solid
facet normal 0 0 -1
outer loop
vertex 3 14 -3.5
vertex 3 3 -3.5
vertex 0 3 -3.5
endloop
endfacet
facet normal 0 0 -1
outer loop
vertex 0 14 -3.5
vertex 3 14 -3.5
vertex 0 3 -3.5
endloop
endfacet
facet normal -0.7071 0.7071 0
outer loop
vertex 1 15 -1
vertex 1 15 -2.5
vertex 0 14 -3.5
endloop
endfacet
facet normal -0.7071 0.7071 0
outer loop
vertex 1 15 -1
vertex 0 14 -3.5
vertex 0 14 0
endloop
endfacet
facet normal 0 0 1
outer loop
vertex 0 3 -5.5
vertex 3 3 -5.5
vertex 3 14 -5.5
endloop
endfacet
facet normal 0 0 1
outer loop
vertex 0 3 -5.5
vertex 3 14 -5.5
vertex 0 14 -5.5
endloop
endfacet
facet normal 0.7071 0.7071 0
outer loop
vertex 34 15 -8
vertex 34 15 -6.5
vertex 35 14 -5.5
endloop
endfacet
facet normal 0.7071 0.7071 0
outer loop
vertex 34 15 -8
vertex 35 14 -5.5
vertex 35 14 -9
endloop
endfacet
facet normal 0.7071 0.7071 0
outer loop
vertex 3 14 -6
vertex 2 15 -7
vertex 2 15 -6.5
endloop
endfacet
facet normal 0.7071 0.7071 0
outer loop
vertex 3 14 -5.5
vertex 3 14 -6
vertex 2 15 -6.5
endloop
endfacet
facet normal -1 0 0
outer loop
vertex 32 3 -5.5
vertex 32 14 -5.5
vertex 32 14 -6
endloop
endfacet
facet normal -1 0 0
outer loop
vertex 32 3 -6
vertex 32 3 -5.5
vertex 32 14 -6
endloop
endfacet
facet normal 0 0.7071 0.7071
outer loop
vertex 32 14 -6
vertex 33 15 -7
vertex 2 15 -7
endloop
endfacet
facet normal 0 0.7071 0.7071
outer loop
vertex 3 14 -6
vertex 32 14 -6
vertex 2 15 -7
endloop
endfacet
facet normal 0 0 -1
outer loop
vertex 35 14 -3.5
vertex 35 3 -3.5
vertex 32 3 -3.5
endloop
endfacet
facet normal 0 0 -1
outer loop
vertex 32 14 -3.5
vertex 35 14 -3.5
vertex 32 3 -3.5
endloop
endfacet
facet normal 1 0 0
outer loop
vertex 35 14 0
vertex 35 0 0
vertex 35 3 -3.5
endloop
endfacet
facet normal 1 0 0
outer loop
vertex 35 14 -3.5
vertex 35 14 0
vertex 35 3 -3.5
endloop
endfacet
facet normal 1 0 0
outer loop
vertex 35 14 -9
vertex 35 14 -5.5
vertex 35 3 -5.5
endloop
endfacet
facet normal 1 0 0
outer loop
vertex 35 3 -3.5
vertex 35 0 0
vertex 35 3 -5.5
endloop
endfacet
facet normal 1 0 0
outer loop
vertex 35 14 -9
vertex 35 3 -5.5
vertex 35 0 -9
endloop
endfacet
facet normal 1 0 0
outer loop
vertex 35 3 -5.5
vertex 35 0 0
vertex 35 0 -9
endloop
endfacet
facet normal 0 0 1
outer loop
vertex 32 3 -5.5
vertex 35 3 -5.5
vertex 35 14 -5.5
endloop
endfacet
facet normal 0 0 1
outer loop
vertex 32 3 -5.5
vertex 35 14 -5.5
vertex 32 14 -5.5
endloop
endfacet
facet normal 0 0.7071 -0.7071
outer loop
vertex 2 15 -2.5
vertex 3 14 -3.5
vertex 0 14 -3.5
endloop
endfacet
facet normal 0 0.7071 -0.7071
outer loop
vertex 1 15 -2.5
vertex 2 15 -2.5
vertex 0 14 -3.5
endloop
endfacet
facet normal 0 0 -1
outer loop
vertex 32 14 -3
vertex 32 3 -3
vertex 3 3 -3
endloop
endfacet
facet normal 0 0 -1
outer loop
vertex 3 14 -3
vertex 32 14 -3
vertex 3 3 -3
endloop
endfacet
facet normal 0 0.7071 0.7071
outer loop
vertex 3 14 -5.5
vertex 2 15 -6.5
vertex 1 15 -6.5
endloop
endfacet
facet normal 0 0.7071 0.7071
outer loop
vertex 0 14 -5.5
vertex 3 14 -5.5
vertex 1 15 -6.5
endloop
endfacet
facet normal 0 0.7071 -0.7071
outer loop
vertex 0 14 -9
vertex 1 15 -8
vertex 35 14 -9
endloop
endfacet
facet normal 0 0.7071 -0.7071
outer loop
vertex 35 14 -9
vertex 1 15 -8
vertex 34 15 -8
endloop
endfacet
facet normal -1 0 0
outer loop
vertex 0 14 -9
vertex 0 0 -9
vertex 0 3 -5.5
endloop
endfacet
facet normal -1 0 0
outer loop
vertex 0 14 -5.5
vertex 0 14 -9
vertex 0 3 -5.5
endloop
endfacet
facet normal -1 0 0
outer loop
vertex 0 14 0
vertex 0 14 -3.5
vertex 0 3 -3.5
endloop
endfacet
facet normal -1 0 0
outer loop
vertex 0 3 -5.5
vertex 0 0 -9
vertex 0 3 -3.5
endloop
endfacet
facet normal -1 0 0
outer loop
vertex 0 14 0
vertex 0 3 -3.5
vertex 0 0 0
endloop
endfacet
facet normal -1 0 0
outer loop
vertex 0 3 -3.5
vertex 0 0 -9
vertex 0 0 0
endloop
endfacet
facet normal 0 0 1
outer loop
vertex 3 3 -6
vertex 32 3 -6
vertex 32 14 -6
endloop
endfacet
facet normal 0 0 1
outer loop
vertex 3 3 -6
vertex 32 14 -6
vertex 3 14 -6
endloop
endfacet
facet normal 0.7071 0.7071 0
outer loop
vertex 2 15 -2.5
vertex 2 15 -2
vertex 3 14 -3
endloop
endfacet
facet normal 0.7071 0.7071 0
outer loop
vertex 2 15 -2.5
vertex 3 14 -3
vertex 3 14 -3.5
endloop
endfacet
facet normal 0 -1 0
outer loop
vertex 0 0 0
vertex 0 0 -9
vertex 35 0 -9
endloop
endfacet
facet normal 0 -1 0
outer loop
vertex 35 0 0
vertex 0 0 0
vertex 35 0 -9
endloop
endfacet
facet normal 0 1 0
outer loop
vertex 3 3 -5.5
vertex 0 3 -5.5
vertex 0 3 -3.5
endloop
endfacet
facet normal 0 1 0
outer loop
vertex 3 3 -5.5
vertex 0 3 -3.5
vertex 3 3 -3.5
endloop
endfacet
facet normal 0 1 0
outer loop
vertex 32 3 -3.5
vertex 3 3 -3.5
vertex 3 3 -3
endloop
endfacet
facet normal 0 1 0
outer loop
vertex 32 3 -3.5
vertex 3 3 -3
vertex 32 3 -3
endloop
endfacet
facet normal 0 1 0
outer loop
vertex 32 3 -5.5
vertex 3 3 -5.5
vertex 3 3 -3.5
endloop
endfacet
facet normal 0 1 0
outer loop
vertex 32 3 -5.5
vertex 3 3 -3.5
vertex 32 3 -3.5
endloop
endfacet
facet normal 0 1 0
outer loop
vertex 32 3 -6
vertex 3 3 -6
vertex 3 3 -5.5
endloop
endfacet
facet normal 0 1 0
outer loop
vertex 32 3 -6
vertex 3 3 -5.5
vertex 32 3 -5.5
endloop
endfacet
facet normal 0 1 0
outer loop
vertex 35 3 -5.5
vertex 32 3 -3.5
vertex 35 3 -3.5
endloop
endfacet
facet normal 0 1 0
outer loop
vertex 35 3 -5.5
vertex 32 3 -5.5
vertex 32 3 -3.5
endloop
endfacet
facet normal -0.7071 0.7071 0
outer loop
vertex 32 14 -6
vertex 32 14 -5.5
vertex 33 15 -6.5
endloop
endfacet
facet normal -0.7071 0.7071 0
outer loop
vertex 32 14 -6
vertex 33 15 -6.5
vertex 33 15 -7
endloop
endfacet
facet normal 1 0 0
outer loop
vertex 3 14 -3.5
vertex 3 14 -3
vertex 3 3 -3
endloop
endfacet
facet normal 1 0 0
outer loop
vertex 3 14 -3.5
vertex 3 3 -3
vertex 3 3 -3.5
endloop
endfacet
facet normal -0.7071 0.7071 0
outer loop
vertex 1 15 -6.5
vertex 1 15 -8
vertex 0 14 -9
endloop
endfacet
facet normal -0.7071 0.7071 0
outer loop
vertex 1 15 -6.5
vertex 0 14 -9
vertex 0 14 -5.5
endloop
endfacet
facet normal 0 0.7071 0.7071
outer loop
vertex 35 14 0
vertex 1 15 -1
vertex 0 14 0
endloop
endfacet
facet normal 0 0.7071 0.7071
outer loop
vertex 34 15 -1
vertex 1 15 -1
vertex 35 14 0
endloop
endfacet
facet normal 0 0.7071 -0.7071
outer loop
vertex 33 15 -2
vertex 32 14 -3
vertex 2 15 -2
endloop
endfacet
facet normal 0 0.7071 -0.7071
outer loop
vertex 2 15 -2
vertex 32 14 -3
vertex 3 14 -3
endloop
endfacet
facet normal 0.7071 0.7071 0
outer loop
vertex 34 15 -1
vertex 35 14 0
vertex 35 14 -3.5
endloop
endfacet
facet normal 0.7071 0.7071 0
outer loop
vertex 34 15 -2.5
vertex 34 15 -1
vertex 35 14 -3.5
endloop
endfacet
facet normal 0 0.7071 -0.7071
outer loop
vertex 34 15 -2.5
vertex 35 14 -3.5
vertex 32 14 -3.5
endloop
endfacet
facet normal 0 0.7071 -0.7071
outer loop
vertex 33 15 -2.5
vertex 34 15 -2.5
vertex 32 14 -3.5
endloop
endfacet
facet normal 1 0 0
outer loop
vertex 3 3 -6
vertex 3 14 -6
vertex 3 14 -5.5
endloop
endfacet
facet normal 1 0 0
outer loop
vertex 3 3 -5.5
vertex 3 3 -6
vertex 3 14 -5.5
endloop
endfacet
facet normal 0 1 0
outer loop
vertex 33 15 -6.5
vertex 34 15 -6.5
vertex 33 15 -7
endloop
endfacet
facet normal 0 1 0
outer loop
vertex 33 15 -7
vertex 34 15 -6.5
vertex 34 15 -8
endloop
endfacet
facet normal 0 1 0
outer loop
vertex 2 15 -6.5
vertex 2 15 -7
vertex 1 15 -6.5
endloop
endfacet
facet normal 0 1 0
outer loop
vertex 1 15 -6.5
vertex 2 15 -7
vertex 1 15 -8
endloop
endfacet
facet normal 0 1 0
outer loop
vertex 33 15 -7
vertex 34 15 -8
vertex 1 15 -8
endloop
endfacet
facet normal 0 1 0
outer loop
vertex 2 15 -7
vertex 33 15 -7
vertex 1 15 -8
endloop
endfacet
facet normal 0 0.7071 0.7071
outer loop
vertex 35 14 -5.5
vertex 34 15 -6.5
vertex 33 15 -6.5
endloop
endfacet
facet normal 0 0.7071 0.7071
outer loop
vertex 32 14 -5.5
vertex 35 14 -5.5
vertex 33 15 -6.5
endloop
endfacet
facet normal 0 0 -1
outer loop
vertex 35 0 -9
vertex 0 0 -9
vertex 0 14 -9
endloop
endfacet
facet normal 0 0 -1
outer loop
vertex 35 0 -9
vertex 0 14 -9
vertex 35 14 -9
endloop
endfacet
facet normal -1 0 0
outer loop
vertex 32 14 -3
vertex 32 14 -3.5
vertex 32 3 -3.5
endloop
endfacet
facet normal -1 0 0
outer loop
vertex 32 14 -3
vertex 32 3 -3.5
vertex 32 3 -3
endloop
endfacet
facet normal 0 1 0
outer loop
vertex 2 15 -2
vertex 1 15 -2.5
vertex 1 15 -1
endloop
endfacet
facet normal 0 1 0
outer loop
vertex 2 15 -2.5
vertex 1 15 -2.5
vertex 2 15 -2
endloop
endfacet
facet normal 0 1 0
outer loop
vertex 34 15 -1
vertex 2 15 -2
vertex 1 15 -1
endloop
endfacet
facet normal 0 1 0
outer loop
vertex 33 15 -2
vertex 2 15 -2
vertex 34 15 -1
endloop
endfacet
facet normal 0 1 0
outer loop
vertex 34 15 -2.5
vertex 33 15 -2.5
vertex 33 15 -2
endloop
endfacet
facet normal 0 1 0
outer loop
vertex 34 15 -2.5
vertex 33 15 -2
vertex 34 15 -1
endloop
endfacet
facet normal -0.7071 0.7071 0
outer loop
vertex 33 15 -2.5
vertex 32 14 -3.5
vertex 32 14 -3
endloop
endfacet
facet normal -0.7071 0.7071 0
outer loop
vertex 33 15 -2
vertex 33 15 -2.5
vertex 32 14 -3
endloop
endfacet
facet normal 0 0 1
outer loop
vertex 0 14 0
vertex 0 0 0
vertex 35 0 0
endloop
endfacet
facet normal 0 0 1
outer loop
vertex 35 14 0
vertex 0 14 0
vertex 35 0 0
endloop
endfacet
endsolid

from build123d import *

# Parameters (mm, degrees)
SKETCH1_W           = 35
SKETCH1_H           = 9
BOSS_EXTRUDE1_DEPTH = 3
BOSS_EXTRUDE2_DEPTH = 12
CHAMFER1_SIZE       = 1


with BuildPart() as part:
    # Sketch1 → Boss-Extrude1 (new body)
    with BuildSketch(Plane(origin=(0, 0, 0), x_dir=(1, 0, 0), z_dir=(0, 1, 0))):
        with Locations((17.5, 4.5)):
            Rectangle(SKETCH1_W, SKETCH1_H)
    extrude(amount=BOSS_EXTRUDE1_DEPTH)

    # Sketch2 → Boss-Extrude2 (add)
    with BuildSketch(Plane(origin=(0, 3, 0), x_dir=(1, 0, 0), z_dir=(0, 1, 0))):
        Polygon((0, 9), (35, 9), (35, 6), (35, 5.5), (32, 5.5), (32, 6), (3, 6), (3, 5.5), (0, 5.5), (0, 6.813124062), align=None)
        Polygon((0, 0), (35, 0), (35, 3), (35, 3.5), (32, 3.5), (32, 3), (3, 3), (3, 3.5), (0, 3.5), (0, 2.186875938), align=None)
    extrude(amount=BOSS_EXTRUDE2_DEPTH)

    # Chamfer1
    chamfer1_edges = [part.edges().sort_by_distance(p)[0] for p in [
        (0, 15, -7.25),
        (1.5, 15, -5.5),
        (3, 15, -5.75),
        (17.5, 15, -6),
        (32, 15, -5.75),
        (33.5, 15, -5.5),
        (35, 15, -7.25),
        (17.5, 15, -9),
        (0, 15, -1.75),
        (17.5, 15, 0),
        (35, 15, -1.75),
        (33.5, 15, -3.5),
        (32, 15, -3.25),
        (17.5, 15, -3),
        (3, 15, -3.25),
        (1.5, 15, -3.5),
    ]]
    chamfer(chamfer1_edges, length=CHAMFER1_SIZE)


solid = part.part
